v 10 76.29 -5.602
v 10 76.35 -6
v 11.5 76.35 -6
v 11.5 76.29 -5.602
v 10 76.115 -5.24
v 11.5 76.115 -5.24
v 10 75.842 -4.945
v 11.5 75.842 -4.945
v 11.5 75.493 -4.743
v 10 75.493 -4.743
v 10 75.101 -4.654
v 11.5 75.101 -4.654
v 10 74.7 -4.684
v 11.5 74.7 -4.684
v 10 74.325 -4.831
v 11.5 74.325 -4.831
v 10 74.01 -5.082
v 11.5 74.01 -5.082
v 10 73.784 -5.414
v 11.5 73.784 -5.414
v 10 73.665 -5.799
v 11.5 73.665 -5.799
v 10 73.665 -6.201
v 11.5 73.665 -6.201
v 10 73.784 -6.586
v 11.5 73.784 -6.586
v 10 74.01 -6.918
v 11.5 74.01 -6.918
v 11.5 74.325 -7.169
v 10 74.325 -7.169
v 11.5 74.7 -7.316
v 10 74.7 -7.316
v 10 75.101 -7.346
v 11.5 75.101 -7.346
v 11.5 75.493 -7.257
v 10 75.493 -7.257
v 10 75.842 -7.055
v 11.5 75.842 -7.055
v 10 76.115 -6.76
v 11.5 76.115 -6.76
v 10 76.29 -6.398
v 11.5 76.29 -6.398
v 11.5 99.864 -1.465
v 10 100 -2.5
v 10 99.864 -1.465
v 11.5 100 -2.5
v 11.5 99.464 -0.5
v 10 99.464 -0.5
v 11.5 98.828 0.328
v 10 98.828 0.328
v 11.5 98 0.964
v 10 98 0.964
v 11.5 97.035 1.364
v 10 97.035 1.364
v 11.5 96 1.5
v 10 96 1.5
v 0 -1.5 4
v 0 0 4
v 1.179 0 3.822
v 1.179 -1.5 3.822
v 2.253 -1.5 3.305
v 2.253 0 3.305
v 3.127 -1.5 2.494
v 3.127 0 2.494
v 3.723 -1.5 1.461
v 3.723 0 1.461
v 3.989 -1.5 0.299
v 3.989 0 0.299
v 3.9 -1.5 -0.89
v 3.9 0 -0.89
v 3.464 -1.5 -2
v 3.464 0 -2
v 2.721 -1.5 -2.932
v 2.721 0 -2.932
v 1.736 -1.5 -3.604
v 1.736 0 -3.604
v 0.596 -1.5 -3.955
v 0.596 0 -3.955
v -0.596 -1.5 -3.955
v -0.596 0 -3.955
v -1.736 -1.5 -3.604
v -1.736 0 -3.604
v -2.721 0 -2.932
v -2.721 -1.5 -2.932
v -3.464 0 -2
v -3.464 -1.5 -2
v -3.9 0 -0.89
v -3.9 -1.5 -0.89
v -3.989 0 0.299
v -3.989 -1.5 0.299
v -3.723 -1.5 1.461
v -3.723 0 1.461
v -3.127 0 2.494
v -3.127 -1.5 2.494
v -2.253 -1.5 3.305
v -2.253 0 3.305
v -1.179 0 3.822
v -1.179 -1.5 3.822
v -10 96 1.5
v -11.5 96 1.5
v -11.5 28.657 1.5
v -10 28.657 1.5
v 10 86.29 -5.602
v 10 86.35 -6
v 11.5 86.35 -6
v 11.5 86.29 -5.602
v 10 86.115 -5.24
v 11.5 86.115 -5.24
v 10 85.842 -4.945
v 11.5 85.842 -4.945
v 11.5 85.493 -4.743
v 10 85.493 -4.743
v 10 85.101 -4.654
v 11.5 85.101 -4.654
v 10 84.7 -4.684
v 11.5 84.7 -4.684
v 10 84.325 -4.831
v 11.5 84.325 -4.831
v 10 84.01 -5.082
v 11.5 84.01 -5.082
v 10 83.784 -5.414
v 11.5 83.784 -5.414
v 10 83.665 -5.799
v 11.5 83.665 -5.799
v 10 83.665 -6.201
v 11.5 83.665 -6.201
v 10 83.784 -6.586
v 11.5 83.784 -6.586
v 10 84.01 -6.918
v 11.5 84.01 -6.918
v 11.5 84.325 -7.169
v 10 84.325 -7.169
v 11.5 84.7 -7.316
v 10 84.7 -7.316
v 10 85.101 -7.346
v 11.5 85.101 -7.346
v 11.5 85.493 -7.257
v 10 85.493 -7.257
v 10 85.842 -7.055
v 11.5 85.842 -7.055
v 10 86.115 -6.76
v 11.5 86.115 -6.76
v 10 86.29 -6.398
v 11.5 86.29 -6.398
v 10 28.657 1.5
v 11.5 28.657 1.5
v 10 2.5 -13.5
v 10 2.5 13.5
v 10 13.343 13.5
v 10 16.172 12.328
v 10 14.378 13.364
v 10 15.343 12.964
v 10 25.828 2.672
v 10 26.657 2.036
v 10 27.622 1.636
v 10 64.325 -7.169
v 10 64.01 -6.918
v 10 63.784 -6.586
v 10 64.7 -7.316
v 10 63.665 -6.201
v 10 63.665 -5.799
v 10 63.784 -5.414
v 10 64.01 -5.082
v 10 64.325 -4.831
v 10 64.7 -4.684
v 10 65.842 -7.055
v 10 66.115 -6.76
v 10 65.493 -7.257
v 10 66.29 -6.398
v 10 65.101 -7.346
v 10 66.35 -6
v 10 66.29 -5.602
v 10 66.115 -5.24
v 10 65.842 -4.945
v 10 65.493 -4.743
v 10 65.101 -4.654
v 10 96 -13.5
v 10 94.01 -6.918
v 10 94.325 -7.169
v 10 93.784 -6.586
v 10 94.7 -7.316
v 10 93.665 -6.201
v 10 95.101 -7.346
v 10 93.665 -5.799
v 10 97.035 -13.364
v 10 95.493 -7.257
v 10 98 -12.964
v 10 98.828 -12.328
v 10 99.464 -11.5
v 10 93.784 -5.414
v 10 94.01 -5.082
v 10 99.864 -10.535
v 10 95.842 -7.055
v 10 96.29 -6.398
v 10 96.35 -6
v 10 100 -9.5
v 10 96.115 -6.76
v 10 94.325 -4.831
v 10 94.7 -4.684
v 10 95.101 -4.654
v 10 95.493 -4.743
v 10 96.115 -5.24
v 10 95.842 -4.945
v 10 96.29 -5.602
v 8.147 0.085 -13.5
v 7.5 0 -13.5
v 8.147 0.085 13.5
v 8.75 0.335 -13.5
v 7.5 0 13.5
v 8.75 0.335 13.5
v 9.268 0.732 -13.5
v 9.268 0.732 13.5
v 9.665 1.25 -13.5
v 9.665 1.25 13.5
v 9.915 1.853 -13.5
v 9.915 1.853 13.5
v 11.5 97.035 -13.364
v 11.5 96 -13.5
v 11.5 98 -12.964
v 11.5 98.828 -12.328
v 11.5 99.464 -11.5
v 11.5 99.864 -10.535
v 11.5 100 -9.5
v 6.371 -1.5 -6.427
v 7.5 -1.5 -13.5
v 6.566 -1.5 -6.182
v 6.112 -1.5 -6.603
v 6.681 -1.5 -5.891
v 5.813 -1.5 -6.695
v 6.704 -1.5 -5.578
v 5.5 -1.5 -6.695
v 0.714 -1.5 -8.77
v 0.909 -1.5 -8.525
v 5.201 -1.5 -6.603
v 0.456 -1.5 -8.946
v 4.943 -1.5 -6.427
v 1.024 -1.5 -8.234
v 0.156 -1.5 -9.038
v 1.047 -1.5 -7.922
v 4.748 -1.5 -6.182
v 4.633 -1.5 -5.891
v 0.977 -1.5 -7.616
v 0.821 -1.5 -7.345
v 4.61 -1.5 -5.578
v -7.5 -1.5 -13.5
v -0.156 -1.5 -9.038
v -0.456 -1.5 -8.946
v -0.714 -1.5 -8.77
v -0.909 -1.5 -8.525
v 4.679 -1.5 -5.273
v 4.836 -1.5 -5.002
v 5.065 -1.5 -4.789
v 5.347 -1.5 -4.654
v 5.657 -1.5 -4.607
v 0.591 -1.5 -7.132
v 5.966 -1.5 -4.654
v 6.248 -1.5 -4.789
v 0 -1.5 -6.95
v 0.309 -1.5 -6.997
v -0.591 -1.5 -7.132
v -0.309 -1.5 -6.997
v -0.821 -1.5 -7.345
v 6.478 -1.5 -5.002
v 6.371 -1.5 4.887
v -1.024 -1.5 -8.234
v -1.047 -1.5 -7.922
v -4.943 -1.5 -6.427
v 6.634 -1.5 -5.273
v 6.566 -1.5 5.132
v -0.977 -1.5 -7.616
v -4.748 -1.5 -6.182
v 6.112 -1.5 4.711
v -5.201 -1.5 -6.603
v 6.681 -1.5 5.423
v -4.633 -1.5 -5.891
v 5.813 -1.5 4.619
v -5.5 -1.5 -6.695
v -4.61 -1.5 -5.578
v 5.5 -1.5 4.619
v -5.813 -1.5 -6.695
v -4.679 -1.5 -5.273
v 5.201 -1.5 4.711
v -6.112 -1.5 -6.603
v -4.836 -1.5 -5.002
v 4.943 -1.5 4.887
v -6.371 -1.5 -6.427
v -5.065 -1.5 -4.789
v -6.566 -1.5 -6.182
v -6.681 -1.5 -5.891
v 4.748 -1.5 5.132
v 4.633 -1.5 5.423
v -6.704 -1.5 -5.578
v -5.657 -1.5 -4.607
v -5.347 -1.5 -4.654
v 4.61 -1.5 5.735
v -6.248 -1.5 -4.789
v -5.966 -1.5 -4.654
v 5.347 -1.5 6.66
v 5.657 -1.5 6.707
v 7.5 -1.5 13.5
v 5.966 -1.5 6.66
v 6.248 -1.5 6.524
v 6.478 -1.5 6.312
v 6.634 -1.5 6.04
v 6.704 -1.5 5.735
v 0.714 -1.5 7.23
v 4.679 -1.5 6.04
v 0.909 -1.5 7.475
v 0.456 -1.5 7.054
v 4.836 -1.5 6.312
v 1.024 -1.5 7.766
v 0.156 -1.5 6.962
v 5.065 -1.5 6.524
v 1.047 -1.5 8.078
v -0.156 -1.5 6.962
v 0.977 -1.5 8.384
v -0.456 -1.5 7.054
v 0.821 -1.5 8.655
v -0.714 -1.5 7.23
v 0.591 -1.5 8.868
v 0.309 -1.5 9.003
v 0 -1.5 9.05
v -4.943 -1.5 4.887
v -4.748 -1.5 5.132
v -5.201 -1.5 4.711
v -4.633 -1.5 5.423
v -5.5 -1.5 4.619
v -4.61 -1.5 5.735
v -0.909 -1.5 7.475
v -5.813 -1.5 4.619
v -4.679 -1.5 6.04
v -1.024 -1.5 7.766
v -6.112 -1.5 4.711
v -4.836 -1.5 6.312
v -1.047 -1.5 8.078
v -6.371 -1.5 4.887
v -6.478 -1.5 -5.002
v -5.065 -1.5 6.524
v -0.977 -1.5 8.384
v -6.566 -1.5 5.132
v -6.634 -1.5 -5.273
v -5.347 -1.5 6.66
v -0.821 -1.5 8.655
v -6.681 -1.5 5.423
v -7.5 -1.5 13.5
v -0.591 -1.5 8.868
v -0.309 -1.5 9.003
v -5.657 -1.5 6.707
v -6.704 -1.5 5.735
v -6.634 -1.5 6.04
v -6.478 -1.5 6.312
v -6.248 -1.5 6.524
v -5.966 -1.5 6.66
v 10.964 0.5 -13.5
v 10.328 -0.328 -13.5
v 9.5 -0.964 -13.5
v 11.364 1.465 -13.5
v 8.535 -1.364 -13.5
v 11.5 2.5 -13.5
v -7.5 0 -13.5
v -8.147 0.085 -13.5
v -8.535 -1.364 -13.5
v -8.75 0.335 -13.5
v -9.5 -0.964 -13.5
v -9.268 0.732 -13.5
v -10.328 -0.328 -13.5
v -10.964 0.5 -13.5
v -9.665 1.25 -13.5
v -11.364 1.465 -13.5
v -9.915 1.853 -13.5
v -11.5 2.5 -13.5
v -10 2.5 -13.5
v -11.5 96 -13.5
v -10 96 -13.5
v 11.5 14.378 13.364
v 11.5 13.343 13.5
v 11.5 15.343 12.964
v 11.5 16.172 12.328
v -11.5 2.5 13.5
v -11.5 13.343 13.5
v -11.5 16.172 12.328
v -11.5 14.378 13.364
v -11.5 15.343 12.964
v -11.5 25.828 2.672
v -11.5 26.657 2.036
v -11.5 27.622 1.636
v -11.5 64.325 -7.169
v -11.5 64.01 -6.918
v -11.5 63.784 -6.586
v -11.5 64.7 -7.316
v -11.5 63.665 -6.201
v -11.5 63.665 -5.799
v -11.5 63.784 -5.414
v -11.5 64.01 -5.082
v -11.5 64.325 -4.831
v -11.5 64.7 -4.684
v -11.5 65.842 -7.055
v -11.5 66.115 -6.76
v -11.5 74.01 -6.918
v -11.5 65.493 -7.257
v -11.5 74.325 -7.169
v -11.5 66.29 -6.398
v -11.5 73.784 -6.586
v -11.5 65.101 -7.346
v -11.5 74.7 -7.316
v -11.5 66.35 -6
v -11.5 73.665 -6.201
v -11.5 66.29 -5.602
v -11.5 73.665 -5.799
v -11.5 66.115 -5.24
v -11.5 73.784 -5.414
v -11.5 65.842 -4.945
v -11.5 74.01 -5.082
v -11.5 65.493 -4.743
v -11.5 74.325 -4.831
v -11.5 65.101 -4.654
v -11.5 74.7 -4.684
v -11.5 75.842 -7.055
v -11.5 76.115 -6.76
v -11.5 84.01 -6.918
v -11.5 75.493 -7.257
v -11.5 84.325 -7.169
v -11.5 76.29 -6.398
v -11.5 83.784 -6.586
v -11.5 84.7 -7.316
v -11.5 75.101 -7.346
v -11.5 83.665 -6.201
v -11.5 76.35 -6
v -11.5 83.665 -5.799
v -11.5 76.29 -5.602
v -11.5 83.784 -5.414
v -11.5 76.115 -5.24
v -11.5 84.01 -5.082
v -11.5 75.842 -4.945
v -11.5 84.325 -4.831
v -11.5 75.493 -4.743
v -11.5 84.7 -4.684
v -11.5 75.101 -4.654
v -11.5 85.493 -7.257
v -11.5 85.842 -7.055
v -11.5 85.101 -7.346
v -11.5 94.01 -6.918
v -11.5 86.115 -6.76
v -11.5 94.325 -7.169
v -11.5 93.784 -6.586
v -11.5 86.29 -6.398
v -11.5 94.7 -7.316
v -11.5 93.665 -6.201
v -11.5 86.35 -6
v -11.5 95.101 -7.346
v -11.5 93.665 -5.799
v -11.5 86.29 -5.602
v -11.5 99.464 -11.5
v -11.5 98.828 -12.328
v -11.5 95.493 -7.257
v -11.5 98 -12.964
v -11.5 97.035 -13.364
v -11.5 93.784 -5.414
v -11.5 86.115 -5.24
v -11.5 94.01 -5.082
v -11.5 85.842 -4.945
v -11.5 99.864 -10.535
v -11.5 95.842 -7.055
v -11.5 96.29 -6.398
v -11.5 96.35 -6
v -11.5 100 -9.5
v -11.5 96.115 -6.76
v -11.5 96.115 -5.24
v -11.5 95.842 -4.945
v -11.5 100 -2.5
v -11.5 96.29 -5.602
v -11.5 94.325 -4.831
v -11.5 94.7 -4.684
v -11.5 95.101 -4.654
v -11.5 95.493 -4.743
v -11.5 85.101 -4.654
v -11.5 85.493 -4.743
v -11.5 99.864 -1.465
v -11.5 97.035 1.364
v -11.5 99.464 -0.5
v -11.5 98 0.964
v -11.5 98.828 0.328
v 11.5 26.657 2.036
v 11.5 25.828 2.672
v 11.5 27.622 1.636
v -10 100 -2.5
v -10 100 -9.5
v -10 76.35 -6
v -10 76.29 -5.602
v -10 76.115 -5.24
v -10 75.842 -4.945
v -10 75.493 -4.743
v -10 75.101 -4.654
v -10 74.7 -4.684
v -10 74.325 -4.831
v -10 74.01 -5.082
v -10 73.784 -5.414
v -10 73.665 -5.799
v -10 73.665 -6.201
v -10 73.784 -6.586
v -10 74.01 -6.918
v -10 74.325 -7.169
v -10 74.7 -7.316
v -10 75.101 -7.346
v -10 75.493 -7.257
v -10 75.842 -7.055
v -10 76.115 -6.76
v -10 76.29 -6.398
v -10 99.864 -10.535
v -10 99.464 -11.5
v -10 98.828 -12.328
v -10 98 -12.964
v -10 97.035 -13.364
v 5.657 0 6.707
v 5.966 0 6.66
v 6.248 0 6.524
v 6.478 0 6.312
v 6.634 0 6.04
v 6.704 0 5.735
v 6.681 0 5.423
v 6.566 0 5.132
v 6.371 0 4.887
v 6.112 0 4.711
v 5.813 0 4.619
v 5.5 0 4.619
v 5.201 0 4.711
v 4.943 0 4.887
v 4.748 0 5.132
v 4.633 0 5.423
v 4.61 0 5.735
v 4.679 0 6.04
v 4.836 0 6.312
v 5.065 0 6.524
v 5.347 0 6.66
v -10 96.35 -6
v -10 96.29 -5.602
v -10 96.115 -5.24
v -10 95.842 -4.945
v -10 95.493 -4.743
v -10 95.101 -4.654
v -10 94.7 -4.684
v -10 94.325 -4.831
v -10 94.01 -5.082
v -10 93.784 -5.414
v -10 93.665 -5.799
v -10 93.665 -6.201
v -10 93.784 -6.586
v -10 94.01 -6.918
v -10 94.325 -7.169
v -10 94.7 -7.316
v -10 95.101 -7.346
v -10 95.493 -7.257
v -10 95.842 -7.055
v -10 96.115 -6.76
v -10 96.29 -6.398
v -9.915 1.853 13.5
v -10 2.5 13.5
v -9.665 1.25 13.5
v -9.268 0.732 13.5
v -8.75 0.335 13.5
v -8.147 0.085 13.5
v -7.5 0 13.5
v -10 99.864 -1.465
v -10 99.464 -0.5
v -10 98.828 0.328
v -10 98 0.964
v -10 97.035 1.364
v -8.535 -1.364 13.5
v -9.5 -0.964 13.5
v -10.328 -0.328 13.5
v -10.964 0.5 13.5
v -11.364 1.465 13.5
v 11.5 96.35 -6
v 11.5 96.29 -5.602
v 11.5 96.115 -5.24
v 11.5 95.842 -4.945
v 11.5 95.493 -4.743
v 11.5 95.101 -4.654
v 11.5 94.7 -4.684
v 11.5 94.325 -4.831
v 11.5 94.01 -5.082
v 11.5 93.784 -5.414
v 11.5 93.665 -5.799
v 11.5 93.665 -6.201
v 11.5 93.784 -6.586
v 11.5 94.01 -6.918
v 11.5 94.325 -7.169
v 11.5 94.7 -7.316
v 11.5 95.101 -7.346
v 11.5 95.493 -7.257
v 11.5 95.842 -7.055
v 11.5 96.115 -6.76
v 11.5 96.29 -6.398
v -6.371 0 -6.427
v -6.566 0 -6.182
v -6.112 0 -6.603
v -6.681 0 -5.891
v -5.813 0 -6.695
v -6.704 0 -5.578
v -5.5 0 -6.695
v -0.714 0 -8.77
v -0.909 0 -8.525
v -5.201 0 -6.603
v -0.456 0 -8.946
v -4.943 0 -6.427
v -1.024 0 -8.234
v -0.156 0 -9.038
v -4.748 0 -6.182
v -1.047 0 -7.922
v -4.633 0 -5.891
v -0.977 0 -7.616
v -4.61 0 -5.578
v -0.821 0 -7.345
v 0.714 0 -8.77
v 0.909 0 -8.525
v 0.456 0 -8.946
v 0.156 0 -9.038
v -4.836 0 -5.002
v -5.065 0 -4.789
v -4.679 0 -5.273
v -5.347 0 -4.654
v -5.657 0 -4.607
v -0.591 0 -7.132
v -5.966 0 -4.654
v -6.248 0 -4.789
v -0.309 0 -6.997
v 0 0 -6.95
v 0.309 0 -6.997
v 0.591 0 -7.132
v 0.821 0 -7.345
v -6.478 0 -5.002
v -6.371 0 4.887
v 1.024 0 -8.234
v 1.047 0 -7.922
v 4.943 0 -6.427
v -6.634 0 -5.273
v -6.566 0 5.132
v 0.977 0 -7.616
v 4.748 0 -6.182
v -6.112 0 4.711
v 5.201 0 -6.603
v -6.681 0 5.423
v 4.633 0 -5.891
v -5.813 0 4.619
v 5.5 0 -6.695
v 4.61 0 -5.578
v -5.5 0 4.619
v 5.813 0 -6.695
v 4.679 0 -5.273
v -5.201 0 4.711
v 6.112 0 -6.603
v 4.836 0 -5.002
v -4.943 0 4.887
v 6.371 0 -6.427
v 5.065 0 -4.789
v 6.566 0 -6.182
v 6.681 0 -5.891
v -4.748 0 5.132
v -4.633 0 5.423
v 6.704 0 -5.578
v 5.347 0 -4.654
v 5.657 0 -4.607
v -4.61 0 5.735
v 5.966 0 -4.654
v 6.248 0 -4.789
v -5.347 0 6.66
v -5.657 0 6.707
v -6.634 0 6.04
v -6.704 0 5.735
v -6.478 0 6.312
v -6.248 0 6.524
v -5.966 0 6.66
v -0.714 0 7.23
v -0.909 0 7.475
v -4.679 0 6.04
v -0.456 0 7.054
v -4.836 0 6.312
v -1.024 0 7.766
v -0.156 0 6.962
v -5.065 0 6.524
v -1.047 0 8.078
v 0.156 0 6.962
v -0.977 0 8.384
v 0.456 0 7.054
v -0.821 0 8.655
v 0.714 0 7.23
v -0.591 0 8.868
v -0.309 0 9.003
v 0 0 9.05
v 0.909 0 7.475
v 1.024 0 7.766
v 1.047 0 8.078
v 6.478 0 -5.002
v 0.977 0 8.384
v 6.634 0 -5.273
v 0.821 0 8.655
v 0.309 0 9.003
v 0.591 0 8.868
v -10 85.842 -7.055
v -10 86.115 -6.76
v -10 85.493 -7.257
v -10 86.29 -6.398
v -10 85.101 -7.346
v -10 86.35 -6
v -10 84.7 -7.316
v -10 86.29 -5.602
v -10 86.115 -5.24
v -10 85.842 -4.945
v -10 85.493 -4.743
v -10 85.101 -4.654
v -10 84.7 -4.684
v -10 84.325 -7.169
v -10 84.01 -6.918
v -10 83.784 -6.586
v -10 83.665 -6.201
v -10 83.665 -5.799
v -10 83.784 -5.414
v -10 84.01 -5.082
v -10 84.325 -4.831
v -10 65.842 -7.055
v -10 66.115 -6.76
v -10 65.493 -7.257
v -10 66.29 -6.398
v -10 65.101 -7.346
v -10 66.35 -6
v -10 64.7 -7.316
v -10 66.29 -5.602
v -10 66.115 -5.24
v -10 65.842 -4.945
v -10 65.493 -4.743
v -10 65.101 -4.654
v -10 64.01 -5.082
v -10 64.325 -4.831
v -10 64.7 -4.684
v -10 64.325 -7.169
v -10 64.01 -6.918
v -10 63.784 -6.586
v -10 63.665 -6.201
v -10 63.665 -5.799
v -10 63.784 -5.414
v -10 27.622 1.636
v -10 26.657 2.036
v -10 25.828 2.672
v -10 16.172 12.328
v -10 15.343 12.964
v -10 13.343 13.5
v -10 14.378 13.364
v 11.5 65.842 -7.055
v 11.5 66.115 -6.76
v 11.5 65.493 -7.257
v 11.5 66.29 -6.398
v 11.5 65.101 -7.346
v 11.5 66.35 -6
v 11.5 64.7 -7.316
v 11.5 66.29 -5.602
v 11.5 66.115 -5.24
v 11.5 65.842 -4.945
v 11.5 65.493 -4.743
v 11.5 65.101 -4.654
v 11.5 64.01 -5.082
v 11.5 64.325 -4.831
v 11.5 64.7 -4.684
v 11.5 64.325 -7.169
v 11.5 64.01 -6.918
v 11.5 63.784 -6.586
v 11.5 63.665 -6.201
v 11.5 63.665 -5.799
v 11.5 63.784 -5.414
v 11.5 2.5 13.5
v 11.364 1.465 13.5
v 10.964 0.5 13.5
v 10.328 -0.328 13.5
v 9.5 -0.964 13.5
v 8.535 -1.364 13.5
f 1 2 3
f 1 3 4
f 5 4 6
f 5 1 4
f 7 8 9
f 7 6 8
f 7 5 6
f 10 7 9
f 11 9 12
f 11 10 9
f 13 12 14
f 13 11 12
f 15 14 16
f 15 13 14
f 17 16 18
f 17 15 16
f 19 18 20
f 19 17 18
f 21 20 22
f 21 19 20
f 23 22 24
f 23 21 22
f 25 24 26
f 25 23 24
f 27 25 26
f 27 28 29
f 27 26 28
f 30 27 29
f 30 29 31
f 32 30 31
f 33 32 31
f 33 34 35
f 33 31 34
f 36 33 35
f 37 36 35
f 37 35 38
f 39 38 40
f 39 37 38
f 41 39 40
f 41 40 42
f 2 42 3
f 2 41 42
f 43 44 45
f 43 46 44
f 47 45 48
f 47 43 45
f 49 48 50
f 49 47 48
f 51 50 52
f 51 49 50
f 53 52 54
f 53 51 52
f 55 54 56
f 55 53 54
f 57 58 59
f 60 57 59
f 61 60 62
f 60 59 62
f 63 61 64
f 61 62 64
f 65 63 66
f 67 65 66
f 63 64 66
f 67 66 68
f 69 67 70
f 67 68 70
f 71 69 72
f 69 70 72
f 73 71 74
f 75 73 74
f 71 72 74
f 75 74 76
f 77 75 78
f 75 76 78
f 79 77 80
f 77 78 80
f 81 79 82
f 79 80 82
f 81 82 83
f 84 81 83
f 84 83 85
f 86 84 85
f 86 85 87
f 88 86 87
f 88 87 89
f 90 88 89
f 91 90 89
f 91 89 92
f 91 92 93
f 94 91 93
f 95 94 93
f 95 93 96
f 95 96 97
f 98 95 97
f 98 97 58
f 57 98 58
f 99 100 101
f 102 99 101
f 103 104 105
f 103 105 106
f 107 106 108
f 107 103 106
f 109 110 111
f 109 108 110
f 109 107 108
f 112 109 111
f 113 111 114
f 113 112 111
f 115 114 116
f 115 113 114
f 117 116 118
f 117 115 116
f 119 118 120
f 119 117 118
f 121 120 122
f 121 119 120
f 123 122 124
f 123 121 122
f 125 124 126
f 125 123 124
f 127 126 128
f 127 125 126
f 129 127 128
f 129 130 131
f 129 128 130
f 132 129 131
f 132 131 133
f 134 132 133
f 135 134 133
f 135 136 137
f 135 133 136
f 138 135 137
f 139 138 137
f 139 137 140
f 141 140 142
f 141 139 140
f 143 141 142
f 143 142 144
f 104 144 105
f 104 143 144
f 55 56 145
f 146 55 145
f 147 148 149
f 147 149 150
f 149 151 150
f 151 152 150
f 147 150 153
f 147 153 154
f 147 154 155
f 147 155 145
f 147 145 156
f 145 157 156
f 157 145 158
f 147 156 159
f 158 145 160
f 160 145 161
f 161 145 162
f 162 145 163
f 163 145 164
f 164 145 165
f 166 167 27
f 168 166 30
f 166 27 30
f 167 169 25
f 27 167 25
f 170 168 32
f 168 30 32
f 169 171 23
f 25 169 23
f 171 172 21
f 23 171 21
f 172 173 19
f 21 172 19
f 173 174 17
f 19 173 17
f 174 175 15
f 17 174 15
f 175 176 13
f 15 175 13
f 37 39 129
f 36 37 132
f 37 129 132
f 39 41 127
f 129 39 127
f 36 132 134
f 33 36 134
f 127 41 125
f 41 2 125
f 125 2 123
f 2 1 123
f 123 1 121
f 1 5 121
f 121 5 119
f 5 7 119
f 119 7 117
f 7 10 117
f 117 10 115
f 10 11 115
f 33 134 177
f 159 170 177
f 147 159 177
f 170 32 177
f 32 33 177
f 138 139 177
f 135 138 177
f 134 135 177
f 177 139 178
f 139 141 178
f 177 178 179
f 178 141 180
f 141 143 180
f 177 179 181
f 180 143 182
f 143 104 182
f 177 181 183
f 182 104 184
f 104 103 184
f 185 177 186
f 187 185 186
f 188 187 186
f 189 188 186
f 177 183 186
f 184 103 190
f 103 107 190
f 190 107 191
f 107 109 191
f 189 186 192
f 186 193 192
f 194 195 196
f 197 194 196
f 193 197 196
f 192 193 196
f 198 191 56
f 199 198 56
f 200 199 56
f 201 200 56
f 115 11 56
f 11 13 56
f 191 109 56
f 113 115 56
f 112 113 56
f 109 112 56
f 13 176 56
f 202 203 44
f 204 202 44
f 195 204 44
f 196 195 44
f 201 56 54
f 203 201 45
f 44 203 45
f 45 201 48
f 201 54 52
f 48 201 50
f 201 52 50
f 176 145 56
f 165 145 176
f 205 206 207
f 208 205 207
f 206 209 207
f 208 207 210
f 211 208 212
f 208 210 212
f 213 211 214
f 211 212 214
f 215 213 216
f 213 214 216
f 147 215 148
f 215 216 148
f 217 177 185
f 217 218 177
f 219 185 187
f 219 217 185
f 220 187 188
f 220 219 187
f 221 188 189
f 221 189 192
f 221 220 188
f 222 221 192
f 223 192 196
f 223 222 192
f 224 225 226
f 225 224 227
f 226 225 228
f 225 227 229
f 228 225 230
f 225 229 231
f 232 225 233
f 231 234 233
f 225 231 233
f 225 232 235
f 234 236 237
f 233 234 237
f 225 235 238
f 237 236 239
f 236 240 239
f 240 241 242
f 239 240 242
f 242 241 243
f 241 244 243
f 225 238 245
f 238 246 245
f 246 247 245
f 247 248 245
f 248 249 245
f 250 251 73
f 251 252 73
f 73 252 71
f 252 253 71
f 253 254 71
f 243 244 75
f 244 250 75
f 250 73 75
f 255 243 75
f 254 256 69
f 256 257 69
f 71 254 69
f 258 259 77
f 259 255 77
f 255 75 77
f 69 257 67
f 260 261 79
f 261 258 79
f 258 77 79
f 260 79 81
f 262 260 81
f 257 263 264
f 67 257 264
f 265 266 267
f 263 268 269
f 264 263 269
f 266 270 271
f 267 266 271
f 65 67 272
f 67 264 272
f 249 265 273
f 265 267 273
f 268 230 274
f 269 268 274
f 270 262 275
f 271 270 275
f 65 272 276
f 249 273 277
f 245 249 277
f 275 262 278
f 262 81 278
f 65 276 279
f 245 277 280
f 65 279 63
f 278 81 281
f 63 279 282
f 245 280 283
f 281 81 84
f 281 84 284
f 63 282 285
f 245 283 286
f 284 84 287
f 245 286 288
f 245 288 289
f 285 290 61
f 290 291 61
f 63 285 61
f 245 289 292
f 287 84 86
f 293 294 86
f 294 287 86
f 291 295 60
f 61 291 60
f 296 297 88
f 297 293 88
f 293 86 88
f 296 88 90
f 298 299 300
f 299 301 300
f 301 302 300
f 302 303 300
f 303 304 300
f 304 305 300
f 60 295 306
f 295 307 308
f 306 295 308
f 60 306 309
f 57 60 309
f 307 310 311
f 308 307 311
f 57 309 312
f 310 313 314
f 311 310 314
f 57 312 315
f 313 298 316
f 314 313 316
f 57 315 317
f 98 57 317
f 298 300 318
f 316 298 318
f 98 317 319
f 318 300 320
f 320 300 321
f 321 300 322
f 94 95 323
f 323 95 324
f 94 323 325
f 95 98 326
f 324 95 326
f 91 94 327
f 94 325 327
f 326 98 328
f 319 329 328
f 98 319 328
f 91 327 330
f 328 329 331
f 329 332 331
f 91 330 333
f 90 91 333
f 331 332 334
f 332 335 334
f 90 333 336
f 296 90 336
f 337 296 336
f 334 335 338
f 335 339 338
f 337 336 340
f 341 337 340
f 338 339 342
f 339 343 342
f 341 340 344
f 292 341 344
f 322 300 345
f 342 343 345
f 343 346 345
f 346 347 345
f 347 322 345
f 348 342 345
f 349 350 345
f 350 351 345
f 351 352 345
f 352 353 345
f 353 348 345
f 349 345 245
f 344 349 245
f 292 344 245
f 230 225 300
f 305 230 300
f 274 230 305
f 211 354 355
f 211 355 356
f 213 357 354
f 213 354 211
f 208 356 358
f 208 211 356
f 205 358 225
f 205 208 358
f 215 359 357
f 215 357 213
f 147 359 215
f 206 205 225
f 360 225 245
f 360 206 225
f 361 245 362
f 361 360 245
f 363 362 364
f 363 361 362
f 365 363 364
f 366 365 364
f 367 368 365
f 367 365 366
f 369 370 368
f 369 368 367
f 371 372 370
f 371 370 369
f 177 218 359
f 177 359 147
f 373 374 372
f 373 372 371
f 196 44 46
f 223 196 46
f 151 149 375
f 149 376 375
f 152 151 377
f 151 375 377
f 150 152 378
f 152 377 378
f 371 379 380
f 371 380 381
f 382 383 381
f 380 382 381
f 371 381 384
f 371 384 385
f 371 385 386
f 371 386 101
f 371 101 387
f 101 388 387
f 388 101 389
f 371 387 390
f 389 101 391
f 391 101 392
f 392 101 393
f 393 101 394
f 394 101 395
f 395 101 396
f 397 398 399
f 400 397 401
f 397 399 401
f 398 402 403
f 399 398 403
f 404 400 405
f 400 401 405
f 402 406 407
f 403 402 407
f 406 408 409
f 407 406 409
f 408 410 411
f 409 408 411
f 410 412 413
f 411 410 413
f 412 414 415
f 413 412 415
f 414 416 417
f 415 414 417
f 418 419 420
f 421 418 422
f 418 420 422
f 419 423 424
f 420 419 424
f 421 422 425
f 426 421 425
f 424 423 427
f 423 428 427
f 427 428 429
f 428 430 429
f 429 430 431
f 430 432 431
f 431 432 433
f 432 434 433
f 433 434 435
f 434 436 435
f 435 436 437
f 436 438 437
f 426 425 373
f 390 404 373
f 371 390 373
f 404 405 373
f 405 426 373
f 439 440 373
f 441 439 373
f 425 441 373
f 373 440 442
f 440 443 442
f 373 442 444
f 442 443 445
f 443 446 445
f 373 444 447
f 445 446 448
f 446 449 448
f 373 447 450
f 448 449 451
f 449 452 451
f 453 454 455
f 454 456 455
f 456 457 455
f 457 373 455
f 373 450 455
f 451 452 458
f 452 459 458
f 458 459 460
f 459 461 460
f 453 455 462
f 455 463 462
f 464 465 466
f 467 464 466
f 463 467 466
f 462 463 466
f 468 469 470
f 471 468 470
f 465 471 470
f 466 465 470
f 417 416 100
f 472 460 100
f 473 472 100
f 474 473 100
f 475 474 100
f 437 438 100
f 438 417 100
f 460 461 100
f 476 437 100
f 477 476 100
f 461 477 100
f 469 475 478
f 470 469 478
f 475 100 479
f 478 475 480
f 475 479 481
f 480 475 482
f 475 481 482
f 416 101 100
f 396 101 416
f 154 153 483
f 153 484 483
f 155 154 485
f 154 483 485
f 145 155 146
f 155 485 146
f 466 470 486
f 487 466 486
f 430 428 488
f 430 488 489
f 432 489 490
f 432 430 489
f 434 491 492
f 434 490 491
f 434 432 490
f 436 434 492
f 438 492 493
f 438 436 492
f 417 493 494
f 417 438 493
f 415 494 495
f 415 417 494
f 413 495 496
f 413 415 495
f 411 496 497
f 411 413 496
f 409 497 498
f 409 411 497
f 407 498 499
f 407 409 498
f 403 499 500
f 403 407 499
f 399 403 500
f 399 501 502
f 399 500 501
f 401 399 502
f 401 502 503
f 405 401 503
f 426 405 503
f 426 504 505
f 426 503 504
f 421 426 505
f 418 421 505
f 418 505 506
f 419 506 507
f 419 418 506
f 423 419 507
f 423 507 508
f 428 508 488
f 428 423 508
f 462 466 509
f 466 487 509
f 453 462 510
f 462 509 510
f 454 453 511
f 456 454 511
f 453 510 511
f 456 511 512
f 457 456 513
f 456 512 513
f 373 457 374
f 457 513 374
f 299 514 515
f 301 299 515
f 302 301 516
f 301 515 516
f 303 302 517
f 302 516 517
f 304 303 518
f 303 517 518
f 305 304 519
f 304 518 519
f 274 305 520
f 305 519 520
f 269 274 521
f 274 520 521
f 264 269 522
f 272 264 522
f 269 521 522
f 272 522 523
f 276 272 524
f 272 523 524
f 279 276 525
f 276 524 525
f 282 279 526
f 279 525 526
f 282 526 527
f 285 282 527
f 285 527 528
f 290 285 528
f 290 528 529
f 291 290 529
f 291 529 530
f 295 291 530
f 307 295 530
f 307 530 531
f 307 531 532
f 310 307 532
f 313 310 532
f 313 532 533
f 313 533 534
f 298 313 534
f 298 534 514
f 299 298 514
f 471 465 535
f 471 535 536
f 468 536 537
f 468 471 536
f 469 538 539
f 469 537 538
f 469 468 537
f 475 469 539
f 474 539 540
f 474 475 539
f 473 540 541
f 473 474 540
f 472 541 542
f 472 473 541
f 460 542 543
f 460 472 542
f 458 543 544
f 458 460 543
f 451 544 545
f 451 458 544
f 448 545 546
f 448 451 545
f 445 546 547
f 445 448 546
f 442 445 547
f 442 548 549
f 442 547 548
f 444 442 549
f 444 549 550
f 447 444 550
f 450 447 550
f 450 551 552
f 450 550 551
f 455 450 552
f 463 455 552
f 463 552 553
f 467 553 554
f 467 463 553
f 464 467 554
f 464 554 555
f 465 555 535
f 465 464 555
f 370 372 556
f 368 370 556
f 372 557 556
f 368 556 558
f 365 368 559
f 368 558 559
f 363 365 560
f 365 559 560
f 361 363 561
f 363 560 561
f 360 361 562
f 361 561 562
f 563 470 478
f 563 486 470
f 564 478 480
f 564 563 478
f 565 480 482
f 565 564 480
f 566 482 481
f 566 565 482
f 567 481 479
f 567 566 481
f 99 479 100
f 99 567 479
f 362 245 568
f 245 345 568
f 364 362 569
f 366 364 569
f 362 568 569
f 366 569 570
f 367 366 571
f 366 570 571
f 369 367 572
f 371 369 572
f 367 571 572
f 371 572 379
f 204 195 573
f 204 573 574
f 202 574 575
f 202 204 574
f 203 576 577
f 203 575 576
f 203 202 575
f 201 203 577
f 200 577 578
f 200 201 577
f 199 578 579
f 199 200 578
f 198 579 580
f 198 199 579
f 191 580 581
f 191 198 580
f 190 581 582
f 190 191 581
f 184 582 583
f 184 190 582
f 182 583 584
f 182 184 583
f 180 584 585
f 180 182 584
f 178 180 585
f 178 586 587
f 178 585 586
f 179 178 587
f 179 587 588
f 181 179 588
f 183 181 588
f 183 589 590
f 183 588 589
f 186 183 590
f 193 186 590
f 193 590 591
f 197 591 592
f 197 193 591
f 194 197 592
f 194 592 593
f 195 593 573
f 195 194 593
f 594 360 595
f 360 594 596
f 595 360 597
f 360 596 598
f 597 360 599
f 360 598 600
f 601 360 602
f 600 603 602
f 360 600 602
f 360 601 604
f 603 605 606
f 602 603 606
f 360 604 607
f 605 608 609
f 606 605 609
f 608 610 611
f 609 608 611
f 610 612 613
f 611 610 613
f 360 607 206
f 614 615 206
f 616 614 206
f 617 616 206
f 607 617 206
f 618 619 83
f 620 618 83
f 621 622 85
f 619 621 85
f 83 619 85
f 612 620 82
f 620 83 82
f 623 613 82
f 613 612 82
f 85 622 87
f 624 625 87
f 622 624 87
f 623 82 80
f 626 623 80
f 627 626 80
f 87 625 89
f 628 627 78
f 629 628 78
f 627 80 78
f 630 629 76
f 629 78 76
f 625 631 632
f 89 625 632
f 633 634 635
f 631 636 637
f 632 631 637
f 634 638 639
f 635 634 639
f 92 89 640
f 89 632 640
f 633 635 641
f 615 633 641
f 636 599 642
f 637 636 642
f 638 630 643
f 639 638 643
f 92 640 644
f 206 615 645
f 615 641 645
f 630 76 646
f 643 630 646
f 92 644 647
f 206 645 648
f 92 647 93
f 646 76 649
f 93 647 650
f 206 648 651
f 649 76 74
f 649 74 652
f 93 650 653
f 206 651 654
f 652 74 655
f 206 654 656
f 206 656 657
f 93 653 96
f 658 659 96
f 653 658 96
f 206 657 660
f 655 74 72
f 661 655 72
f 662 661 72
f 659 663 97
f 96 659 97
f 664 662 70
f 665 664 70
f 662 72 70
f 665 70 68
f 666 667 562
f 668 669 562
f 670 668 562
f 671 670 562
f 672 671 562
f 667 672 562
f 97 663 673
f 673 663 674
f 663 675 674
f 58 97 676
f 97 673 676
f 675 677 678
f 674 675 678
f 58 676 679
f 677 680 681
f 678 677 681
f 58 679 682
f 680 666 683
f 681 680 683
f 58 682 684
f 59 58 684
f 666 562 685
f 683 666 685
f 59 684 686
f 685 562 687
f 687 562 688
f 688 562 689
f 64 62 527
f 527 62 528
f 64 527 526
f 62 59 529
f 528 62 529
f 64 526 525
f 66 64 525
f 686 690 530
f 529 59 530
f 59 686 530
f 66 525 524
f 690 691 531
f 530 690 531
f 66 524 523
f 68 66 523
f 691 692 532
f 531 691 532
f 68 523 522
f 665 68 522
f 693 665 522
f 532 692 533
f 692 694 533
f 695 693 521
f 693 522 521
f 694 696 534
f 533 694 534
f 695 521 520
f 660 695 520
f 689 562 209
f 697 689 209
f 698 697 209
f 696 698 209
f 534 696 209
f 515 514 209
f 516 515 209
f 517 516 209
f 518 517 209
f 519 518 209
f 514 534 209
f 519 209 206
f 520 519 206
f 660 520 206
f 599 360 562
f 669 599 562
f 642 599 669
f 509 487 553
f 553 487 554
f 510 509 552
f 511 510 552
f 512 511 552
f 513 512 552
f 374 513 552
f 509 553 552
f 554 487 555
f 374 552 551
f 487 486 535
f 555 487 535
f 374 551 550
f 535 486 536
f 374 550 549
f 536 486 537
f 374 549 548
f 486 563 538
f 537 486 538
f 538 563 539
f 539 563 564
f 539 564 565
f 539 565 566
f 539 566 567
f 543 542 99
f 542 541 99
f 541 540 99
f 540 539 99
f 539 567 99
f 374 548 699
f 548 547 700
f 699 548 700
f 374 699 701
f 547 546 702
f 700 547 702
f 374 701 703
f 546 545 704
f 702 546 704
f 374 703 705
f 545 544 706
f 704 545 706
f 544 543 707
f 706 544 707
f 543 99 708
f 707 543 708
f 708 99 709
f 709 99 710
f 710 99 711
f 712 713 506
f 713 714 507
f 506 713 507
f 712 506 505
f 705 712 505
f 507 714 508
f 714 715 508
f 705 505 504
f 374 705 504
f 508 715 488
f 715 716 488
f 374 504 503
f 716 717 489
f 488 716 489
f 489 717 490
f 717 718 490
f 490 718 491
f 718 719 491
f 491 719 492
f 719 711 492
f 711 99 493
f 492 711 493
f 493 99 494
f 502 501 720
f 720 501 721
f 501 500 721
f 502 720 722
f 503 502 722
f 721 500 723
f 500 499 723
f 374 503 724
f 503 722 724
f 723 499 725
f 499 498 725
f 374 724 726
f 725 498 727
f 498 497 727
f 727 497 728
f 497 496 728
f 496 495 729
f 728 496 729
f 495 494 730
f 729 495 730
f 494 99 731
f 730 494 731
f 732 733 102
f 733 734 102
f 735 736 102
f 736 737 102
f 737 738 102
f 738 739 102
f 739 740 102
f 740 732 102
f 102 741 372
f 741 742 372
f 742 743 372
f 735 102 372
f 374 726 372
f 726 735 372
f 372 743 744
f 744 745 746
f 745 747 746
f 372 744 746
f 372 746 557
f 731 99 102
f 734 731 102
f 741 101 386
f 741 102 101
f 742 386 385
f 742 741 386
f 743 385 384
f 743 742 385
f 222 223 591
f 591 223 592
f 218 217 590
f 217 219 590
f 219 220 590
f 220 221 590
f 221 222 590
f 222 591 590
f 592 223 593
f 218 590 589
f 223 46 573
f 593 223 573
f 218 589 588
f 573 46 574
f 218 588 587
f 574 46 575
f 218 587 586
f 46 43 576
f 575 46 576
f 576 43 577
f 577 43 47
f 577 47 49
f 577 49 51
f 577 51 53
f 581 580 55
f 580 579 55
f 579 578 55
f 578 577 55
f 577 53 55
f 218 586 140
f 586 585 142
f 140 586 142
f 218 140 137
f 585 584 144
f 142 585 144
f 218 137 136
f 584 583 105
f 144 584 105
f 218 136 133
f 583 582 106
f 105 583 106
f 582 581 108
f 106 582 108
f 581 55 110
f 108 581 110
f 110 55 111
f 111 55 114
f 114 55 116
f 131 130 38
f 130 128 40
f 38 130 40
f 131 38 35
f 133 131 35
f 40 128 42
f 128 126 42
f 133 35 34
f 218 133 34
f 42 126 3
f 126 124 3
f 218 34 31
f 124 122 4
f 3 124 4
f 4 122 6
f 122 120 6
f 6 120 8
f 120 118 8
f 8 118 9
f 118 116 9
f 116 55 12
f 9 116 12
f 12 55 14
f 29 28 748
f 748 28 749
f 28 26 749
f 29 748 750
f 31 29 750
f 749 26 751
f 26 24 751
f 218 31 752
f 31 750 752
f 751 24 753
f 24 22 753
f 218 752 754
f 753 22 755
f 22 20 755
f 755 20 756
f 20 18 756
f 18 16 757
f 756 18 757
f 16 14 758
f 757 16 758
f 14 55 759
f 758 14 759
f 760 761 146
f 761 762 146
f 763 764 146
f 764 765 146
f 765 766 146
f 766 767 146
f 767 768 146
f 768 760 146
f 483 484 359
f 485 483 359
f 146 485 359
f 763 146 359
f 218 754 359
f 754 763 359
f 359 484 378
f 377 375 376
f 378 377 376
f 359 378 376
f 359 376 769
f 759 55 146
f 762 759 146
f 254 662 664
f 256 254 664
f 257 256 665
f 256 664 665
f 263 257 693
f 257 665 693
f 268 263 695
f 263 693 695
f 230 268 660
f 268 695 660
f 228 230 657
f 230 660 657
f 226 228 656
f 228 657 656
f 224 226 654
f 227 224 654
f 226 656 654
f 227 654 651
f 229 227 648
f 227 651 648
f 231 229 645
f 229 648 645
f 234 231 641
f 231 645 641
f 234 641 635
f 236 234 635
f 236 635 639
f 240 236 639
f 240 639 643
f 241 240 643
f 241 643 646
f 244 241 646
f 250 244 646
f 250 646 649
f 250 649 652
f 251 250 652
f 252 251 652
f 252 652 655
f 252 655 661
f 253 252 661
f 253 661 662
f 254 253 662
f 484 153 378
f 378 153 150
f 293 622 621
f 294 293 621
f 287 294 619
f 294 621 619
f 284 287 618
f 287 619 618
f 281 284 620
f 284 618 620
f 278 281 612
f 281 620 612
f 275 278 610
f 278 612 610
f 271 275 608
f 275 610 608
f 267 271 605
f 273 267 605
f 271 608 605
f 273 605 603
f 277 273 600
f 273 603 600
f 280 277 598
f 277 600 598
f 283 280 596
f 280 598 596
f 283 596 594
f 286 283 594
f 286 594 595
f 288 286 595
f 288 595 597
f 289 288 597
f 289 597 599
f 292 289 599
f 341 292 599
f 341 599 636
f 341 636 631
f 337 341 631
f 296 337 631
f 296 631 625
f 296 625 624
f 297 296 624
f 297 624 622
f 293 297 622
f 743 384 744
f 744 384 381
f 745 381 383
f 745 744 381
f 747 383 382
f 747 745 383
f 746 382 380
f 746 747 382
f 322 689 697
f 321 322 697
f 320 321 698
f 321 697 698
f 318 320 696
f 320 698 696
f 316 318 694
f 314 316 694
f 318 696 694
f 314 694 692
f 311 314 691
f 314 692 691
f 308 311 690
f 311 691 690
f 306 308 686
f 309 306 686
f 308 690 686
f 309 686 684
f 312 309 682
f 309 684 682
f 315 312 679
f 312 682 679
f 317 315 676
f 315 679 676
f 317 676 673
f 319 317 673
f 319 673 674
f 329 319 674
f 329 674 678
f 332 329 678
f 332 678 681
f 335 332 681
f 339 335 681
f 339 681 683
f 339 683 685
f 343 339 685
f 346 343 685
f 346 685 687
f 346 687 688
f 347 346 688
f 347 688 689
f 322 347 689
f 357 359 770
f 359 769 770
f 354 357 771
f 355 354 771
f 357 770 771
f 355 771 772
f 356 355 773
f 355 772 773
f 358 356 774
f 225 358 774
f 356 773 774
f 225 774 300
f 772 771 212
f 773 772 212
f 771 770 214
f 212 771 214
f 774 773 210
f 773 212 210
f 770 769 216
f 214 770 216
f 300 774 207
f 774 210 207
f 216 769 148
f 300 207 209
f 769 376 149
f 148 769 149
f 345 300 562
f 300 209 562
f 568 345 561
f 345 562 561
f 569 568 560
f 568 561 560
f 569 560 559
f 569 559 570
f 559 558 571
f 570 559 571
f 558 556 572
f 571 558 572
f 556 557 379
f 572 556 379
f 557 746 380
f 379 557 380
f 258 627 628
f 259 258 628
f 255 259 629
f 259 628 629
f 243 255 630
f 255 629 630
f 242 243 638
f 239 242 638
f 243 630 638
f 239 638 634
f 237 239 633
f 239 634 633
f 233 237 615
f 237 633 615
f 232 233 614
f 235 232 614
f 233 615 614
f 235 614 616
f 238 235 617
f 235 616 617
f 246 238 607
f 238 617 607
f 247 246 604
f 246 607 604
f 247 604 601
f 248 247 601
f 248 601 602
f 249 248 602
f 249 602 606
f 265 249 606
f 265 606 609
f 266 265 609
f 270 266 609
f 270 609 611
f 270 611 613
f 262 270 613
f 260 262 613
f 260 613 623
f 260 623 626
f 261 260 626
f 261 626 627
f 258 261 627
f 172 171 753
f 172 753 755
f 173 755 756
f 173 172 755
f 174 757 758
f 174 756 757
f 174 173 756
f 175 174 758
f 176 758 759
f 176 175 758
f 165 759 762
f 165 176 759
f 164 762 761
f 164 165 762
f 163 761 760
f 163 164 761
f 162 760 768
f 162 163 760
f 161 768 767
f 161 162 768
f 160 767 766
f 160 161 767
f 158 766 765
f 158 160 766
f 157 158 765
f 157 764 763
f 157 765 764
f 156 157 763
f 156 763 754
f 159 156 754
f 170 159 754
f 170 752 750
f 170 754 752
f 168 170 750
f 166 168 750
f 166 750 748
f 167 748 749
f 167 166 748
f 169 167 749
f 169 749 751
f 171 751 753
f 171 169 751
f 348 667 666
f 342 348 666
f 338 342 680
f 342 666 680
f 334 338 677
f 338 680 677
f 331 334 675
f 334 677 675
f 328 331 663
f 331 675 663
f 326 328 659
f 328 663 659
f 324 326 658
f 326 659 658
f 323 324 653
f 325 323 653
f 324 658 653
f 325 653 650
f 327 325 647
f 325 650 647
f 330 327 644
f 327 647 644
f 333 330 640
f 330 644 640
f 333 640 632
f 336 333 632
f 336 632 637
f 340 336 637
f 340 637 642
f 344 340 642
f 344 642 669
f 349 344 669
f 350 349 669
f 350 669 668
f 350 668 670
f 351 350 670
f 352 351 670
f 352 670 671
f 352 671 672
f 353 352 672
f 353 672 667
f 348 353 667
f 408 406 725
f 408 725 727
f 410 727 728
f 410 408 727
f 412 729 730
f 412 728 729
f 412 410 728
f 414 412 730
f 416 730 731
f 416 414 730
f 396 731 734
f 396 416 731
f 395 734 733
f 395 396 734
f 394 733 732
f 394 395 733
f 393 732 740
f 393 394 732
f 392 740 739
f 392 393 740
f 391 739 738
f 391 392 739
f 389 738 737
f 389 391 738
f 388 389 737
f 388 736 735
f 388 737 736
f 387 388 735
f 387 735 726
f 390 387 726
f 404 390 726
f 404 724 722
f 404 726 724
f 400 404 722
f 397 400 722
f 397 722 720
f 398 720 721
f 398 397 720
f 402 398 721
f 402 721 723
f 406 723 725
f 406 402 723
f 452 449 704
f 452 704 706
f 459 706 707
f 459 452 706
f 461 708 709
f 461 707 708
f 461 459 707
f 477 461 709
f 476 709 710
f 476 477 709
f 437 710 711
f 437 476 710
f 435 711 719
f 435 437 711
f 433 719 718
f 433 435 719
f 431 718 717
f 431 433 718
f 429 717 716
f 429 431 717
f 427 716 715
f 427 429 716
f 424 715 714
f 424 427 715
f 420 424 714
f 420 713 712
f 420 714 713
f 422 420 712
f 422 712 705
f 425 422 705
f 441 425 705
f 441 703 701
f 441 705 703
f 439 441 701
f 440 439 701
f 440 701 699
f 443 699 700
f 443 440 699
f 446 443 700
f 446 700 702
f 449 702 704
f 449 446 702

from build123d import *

# Parameters (mm, degrees)
BASE_FLANGE1_DEPTH      = 13.5
SKETCH5_R               = 4
SKETCH5_R_2             = 1.05
CUT_EXTRUDE1_DEPTH      = 10
CUT_EXTRUDE2_DEPTH      = 102.5603269
CUT_EXTRUDE2_DEPTH_BACK = 102.5603269
CUT_EXTRUDE3_DEPTH      = 104.495168969
CUT_EXTRUDE3_DEPTH_BACK = 104.495168969
SKETCH7_R               = 1.35
FILLET1_R               = 4


# Sheet-metal steps are written as plain solids
with BuildPart() as part:
    # Sketch1 → Base-Flange1 (new, symmetric)
    with BuildSketch(Plane.XY):
        with BuildLine():
            Line((-10, 100), (-10, 2.5))
            ThreePointArc((-10, 2.5), (-9.267766953, 0.732233047), (-7.5, 0))
            Line((-7.5, 0), (7.5, 0))
            ThreePointArc((7.5, 0), (9.267766953, 0.732233047), (10, 2.5))
            Line((10, 2.5), (10, 100))
            Line((10, 100), (11.5, 100))
            Line((11.5, 100), (11.5, 2.5))
            ThreePointArc((11.5, 2.5), (10.328427125, -0.328427125), (7.5, -1.5))
            Line((7.5, -1.5), (-7.5, -1.5))
            ThreePointArc((-7.5, -1.5), (-10.328427125, -0.328427125), (-11.5, 2.5))
            Line((-11.5, 2.5), (-11.5, 100))
            Line((-11.5, 100), (-10, 100))
        make_face()
    extrude(amount=BASE_FLANGE1_DEPTH, both=True)

    # Sketch5 → Cut-Extrude1 (cut)
    with BuildSketch(Plane(origin=(0, 0, 0), x_dir=(1, 0, 0), z_dir=(0, 1, 0))):
        with Locations(Location((0, 0, 0), (0, 0, 270))):
            Circle(SKETCH5_R)
        with Locations(Location((-5.656854249, 5.656854249, 0), (0, 0, 270))):
            Circle(SKETCH5_R_2)
        with Locations(Location((0, 8, 0), (0, 0, 270))):
            Circle(SKETCH5_R_2)
        with Locations(Location((5.656854249, 5.656854249, 0), (0, 0, 270))):
            Circle(SKETCH5_R_2)
        with Locations(Location((5.656854249, -5.656854249, 0), (0, 0, 270))):
            Circle(SKETCH5_R_2)
        with Locations(Location((0, -8, 0), (0, 0, 270))):
            Circle(SKETCH5_R_2)
        with Locations(Location((-5.656854249, -5.656854249, 0), (0, 0, 270))):
            Circle(SKETCH5_R_2)
    extrude(amount=-CUT_EXTRUDE1_DEPTH, mode=Mode.SUBTRACT)

    # Sketch6 → Cut-Extrude2 (cut, two sides: drawn at the far end of the back side and taken through both)
    with BuildSketch(Plane(origin=(0, 0, 0), x_dir=(0, 0, -1), z_dir=(1, 0, 0)).offset(-CUT_EXTRUDE2_DEPTH_BACK)):
        Polygon((-1.5, 100), (-1.5, 27), (-13.5, 15), (-13.5, 100), align=None)
    extrude(amount=CUT_EXTRUDE2_DEPTH + CUT_EXTRUDE2_DEPTH_BACK, mode=Mode.SUBTRACT)

    # Sketch7 → Cut-Extrude3 (cut, two sides: drawn at the far end of the back side and taken through both)
    with BuildSketch(Plane(origin=(11.5, 0, 0), x_dir=(0, 0, -1), z_dir=(1, 0, 0)).offset(-CUT_EXTRUDE3_DEPTH_BACK)):
        with Locations(Location((6, 95, 0), (0, 0, 90))):
            Circle(SKETCH7_R)
        with Locations(Location((6, 85, 0), (0, 0, 90))):
            Circle(SKETCH7_R)
        with Locations(Location((6, 75, 0), (0, 0, 90))):
            Circle(SKETCH7_R)
        with Locations(Location((6, 65, 0), (0, 0, 90))):
            Circle(SKETCH7_R)
    extrude(amount=CUT_EXTRUDE3_DEPTH + CUT_EXTRUDE3_DEPTH_BACK, mode=Mode.SUBTRACT)

    # Fillet1
    fillet1_edges = [part.edges().sort_by_distance(p)[0] for p in [
        (-10.75, 27, 1.5),
        (-10.75, 100, 1.5),
        (-10.75, 15, 13.5),
        (-10.75, 100, -13.5),
        (10.75, 27, 1.5),
        (10.75, 15, 13.5),
        (10.75, 100, 1.5),
        (10.75, 100, -13.5),
    ]]
    fillet(fillet1_edges, radius=FILLET1_R)


solid = part.part
